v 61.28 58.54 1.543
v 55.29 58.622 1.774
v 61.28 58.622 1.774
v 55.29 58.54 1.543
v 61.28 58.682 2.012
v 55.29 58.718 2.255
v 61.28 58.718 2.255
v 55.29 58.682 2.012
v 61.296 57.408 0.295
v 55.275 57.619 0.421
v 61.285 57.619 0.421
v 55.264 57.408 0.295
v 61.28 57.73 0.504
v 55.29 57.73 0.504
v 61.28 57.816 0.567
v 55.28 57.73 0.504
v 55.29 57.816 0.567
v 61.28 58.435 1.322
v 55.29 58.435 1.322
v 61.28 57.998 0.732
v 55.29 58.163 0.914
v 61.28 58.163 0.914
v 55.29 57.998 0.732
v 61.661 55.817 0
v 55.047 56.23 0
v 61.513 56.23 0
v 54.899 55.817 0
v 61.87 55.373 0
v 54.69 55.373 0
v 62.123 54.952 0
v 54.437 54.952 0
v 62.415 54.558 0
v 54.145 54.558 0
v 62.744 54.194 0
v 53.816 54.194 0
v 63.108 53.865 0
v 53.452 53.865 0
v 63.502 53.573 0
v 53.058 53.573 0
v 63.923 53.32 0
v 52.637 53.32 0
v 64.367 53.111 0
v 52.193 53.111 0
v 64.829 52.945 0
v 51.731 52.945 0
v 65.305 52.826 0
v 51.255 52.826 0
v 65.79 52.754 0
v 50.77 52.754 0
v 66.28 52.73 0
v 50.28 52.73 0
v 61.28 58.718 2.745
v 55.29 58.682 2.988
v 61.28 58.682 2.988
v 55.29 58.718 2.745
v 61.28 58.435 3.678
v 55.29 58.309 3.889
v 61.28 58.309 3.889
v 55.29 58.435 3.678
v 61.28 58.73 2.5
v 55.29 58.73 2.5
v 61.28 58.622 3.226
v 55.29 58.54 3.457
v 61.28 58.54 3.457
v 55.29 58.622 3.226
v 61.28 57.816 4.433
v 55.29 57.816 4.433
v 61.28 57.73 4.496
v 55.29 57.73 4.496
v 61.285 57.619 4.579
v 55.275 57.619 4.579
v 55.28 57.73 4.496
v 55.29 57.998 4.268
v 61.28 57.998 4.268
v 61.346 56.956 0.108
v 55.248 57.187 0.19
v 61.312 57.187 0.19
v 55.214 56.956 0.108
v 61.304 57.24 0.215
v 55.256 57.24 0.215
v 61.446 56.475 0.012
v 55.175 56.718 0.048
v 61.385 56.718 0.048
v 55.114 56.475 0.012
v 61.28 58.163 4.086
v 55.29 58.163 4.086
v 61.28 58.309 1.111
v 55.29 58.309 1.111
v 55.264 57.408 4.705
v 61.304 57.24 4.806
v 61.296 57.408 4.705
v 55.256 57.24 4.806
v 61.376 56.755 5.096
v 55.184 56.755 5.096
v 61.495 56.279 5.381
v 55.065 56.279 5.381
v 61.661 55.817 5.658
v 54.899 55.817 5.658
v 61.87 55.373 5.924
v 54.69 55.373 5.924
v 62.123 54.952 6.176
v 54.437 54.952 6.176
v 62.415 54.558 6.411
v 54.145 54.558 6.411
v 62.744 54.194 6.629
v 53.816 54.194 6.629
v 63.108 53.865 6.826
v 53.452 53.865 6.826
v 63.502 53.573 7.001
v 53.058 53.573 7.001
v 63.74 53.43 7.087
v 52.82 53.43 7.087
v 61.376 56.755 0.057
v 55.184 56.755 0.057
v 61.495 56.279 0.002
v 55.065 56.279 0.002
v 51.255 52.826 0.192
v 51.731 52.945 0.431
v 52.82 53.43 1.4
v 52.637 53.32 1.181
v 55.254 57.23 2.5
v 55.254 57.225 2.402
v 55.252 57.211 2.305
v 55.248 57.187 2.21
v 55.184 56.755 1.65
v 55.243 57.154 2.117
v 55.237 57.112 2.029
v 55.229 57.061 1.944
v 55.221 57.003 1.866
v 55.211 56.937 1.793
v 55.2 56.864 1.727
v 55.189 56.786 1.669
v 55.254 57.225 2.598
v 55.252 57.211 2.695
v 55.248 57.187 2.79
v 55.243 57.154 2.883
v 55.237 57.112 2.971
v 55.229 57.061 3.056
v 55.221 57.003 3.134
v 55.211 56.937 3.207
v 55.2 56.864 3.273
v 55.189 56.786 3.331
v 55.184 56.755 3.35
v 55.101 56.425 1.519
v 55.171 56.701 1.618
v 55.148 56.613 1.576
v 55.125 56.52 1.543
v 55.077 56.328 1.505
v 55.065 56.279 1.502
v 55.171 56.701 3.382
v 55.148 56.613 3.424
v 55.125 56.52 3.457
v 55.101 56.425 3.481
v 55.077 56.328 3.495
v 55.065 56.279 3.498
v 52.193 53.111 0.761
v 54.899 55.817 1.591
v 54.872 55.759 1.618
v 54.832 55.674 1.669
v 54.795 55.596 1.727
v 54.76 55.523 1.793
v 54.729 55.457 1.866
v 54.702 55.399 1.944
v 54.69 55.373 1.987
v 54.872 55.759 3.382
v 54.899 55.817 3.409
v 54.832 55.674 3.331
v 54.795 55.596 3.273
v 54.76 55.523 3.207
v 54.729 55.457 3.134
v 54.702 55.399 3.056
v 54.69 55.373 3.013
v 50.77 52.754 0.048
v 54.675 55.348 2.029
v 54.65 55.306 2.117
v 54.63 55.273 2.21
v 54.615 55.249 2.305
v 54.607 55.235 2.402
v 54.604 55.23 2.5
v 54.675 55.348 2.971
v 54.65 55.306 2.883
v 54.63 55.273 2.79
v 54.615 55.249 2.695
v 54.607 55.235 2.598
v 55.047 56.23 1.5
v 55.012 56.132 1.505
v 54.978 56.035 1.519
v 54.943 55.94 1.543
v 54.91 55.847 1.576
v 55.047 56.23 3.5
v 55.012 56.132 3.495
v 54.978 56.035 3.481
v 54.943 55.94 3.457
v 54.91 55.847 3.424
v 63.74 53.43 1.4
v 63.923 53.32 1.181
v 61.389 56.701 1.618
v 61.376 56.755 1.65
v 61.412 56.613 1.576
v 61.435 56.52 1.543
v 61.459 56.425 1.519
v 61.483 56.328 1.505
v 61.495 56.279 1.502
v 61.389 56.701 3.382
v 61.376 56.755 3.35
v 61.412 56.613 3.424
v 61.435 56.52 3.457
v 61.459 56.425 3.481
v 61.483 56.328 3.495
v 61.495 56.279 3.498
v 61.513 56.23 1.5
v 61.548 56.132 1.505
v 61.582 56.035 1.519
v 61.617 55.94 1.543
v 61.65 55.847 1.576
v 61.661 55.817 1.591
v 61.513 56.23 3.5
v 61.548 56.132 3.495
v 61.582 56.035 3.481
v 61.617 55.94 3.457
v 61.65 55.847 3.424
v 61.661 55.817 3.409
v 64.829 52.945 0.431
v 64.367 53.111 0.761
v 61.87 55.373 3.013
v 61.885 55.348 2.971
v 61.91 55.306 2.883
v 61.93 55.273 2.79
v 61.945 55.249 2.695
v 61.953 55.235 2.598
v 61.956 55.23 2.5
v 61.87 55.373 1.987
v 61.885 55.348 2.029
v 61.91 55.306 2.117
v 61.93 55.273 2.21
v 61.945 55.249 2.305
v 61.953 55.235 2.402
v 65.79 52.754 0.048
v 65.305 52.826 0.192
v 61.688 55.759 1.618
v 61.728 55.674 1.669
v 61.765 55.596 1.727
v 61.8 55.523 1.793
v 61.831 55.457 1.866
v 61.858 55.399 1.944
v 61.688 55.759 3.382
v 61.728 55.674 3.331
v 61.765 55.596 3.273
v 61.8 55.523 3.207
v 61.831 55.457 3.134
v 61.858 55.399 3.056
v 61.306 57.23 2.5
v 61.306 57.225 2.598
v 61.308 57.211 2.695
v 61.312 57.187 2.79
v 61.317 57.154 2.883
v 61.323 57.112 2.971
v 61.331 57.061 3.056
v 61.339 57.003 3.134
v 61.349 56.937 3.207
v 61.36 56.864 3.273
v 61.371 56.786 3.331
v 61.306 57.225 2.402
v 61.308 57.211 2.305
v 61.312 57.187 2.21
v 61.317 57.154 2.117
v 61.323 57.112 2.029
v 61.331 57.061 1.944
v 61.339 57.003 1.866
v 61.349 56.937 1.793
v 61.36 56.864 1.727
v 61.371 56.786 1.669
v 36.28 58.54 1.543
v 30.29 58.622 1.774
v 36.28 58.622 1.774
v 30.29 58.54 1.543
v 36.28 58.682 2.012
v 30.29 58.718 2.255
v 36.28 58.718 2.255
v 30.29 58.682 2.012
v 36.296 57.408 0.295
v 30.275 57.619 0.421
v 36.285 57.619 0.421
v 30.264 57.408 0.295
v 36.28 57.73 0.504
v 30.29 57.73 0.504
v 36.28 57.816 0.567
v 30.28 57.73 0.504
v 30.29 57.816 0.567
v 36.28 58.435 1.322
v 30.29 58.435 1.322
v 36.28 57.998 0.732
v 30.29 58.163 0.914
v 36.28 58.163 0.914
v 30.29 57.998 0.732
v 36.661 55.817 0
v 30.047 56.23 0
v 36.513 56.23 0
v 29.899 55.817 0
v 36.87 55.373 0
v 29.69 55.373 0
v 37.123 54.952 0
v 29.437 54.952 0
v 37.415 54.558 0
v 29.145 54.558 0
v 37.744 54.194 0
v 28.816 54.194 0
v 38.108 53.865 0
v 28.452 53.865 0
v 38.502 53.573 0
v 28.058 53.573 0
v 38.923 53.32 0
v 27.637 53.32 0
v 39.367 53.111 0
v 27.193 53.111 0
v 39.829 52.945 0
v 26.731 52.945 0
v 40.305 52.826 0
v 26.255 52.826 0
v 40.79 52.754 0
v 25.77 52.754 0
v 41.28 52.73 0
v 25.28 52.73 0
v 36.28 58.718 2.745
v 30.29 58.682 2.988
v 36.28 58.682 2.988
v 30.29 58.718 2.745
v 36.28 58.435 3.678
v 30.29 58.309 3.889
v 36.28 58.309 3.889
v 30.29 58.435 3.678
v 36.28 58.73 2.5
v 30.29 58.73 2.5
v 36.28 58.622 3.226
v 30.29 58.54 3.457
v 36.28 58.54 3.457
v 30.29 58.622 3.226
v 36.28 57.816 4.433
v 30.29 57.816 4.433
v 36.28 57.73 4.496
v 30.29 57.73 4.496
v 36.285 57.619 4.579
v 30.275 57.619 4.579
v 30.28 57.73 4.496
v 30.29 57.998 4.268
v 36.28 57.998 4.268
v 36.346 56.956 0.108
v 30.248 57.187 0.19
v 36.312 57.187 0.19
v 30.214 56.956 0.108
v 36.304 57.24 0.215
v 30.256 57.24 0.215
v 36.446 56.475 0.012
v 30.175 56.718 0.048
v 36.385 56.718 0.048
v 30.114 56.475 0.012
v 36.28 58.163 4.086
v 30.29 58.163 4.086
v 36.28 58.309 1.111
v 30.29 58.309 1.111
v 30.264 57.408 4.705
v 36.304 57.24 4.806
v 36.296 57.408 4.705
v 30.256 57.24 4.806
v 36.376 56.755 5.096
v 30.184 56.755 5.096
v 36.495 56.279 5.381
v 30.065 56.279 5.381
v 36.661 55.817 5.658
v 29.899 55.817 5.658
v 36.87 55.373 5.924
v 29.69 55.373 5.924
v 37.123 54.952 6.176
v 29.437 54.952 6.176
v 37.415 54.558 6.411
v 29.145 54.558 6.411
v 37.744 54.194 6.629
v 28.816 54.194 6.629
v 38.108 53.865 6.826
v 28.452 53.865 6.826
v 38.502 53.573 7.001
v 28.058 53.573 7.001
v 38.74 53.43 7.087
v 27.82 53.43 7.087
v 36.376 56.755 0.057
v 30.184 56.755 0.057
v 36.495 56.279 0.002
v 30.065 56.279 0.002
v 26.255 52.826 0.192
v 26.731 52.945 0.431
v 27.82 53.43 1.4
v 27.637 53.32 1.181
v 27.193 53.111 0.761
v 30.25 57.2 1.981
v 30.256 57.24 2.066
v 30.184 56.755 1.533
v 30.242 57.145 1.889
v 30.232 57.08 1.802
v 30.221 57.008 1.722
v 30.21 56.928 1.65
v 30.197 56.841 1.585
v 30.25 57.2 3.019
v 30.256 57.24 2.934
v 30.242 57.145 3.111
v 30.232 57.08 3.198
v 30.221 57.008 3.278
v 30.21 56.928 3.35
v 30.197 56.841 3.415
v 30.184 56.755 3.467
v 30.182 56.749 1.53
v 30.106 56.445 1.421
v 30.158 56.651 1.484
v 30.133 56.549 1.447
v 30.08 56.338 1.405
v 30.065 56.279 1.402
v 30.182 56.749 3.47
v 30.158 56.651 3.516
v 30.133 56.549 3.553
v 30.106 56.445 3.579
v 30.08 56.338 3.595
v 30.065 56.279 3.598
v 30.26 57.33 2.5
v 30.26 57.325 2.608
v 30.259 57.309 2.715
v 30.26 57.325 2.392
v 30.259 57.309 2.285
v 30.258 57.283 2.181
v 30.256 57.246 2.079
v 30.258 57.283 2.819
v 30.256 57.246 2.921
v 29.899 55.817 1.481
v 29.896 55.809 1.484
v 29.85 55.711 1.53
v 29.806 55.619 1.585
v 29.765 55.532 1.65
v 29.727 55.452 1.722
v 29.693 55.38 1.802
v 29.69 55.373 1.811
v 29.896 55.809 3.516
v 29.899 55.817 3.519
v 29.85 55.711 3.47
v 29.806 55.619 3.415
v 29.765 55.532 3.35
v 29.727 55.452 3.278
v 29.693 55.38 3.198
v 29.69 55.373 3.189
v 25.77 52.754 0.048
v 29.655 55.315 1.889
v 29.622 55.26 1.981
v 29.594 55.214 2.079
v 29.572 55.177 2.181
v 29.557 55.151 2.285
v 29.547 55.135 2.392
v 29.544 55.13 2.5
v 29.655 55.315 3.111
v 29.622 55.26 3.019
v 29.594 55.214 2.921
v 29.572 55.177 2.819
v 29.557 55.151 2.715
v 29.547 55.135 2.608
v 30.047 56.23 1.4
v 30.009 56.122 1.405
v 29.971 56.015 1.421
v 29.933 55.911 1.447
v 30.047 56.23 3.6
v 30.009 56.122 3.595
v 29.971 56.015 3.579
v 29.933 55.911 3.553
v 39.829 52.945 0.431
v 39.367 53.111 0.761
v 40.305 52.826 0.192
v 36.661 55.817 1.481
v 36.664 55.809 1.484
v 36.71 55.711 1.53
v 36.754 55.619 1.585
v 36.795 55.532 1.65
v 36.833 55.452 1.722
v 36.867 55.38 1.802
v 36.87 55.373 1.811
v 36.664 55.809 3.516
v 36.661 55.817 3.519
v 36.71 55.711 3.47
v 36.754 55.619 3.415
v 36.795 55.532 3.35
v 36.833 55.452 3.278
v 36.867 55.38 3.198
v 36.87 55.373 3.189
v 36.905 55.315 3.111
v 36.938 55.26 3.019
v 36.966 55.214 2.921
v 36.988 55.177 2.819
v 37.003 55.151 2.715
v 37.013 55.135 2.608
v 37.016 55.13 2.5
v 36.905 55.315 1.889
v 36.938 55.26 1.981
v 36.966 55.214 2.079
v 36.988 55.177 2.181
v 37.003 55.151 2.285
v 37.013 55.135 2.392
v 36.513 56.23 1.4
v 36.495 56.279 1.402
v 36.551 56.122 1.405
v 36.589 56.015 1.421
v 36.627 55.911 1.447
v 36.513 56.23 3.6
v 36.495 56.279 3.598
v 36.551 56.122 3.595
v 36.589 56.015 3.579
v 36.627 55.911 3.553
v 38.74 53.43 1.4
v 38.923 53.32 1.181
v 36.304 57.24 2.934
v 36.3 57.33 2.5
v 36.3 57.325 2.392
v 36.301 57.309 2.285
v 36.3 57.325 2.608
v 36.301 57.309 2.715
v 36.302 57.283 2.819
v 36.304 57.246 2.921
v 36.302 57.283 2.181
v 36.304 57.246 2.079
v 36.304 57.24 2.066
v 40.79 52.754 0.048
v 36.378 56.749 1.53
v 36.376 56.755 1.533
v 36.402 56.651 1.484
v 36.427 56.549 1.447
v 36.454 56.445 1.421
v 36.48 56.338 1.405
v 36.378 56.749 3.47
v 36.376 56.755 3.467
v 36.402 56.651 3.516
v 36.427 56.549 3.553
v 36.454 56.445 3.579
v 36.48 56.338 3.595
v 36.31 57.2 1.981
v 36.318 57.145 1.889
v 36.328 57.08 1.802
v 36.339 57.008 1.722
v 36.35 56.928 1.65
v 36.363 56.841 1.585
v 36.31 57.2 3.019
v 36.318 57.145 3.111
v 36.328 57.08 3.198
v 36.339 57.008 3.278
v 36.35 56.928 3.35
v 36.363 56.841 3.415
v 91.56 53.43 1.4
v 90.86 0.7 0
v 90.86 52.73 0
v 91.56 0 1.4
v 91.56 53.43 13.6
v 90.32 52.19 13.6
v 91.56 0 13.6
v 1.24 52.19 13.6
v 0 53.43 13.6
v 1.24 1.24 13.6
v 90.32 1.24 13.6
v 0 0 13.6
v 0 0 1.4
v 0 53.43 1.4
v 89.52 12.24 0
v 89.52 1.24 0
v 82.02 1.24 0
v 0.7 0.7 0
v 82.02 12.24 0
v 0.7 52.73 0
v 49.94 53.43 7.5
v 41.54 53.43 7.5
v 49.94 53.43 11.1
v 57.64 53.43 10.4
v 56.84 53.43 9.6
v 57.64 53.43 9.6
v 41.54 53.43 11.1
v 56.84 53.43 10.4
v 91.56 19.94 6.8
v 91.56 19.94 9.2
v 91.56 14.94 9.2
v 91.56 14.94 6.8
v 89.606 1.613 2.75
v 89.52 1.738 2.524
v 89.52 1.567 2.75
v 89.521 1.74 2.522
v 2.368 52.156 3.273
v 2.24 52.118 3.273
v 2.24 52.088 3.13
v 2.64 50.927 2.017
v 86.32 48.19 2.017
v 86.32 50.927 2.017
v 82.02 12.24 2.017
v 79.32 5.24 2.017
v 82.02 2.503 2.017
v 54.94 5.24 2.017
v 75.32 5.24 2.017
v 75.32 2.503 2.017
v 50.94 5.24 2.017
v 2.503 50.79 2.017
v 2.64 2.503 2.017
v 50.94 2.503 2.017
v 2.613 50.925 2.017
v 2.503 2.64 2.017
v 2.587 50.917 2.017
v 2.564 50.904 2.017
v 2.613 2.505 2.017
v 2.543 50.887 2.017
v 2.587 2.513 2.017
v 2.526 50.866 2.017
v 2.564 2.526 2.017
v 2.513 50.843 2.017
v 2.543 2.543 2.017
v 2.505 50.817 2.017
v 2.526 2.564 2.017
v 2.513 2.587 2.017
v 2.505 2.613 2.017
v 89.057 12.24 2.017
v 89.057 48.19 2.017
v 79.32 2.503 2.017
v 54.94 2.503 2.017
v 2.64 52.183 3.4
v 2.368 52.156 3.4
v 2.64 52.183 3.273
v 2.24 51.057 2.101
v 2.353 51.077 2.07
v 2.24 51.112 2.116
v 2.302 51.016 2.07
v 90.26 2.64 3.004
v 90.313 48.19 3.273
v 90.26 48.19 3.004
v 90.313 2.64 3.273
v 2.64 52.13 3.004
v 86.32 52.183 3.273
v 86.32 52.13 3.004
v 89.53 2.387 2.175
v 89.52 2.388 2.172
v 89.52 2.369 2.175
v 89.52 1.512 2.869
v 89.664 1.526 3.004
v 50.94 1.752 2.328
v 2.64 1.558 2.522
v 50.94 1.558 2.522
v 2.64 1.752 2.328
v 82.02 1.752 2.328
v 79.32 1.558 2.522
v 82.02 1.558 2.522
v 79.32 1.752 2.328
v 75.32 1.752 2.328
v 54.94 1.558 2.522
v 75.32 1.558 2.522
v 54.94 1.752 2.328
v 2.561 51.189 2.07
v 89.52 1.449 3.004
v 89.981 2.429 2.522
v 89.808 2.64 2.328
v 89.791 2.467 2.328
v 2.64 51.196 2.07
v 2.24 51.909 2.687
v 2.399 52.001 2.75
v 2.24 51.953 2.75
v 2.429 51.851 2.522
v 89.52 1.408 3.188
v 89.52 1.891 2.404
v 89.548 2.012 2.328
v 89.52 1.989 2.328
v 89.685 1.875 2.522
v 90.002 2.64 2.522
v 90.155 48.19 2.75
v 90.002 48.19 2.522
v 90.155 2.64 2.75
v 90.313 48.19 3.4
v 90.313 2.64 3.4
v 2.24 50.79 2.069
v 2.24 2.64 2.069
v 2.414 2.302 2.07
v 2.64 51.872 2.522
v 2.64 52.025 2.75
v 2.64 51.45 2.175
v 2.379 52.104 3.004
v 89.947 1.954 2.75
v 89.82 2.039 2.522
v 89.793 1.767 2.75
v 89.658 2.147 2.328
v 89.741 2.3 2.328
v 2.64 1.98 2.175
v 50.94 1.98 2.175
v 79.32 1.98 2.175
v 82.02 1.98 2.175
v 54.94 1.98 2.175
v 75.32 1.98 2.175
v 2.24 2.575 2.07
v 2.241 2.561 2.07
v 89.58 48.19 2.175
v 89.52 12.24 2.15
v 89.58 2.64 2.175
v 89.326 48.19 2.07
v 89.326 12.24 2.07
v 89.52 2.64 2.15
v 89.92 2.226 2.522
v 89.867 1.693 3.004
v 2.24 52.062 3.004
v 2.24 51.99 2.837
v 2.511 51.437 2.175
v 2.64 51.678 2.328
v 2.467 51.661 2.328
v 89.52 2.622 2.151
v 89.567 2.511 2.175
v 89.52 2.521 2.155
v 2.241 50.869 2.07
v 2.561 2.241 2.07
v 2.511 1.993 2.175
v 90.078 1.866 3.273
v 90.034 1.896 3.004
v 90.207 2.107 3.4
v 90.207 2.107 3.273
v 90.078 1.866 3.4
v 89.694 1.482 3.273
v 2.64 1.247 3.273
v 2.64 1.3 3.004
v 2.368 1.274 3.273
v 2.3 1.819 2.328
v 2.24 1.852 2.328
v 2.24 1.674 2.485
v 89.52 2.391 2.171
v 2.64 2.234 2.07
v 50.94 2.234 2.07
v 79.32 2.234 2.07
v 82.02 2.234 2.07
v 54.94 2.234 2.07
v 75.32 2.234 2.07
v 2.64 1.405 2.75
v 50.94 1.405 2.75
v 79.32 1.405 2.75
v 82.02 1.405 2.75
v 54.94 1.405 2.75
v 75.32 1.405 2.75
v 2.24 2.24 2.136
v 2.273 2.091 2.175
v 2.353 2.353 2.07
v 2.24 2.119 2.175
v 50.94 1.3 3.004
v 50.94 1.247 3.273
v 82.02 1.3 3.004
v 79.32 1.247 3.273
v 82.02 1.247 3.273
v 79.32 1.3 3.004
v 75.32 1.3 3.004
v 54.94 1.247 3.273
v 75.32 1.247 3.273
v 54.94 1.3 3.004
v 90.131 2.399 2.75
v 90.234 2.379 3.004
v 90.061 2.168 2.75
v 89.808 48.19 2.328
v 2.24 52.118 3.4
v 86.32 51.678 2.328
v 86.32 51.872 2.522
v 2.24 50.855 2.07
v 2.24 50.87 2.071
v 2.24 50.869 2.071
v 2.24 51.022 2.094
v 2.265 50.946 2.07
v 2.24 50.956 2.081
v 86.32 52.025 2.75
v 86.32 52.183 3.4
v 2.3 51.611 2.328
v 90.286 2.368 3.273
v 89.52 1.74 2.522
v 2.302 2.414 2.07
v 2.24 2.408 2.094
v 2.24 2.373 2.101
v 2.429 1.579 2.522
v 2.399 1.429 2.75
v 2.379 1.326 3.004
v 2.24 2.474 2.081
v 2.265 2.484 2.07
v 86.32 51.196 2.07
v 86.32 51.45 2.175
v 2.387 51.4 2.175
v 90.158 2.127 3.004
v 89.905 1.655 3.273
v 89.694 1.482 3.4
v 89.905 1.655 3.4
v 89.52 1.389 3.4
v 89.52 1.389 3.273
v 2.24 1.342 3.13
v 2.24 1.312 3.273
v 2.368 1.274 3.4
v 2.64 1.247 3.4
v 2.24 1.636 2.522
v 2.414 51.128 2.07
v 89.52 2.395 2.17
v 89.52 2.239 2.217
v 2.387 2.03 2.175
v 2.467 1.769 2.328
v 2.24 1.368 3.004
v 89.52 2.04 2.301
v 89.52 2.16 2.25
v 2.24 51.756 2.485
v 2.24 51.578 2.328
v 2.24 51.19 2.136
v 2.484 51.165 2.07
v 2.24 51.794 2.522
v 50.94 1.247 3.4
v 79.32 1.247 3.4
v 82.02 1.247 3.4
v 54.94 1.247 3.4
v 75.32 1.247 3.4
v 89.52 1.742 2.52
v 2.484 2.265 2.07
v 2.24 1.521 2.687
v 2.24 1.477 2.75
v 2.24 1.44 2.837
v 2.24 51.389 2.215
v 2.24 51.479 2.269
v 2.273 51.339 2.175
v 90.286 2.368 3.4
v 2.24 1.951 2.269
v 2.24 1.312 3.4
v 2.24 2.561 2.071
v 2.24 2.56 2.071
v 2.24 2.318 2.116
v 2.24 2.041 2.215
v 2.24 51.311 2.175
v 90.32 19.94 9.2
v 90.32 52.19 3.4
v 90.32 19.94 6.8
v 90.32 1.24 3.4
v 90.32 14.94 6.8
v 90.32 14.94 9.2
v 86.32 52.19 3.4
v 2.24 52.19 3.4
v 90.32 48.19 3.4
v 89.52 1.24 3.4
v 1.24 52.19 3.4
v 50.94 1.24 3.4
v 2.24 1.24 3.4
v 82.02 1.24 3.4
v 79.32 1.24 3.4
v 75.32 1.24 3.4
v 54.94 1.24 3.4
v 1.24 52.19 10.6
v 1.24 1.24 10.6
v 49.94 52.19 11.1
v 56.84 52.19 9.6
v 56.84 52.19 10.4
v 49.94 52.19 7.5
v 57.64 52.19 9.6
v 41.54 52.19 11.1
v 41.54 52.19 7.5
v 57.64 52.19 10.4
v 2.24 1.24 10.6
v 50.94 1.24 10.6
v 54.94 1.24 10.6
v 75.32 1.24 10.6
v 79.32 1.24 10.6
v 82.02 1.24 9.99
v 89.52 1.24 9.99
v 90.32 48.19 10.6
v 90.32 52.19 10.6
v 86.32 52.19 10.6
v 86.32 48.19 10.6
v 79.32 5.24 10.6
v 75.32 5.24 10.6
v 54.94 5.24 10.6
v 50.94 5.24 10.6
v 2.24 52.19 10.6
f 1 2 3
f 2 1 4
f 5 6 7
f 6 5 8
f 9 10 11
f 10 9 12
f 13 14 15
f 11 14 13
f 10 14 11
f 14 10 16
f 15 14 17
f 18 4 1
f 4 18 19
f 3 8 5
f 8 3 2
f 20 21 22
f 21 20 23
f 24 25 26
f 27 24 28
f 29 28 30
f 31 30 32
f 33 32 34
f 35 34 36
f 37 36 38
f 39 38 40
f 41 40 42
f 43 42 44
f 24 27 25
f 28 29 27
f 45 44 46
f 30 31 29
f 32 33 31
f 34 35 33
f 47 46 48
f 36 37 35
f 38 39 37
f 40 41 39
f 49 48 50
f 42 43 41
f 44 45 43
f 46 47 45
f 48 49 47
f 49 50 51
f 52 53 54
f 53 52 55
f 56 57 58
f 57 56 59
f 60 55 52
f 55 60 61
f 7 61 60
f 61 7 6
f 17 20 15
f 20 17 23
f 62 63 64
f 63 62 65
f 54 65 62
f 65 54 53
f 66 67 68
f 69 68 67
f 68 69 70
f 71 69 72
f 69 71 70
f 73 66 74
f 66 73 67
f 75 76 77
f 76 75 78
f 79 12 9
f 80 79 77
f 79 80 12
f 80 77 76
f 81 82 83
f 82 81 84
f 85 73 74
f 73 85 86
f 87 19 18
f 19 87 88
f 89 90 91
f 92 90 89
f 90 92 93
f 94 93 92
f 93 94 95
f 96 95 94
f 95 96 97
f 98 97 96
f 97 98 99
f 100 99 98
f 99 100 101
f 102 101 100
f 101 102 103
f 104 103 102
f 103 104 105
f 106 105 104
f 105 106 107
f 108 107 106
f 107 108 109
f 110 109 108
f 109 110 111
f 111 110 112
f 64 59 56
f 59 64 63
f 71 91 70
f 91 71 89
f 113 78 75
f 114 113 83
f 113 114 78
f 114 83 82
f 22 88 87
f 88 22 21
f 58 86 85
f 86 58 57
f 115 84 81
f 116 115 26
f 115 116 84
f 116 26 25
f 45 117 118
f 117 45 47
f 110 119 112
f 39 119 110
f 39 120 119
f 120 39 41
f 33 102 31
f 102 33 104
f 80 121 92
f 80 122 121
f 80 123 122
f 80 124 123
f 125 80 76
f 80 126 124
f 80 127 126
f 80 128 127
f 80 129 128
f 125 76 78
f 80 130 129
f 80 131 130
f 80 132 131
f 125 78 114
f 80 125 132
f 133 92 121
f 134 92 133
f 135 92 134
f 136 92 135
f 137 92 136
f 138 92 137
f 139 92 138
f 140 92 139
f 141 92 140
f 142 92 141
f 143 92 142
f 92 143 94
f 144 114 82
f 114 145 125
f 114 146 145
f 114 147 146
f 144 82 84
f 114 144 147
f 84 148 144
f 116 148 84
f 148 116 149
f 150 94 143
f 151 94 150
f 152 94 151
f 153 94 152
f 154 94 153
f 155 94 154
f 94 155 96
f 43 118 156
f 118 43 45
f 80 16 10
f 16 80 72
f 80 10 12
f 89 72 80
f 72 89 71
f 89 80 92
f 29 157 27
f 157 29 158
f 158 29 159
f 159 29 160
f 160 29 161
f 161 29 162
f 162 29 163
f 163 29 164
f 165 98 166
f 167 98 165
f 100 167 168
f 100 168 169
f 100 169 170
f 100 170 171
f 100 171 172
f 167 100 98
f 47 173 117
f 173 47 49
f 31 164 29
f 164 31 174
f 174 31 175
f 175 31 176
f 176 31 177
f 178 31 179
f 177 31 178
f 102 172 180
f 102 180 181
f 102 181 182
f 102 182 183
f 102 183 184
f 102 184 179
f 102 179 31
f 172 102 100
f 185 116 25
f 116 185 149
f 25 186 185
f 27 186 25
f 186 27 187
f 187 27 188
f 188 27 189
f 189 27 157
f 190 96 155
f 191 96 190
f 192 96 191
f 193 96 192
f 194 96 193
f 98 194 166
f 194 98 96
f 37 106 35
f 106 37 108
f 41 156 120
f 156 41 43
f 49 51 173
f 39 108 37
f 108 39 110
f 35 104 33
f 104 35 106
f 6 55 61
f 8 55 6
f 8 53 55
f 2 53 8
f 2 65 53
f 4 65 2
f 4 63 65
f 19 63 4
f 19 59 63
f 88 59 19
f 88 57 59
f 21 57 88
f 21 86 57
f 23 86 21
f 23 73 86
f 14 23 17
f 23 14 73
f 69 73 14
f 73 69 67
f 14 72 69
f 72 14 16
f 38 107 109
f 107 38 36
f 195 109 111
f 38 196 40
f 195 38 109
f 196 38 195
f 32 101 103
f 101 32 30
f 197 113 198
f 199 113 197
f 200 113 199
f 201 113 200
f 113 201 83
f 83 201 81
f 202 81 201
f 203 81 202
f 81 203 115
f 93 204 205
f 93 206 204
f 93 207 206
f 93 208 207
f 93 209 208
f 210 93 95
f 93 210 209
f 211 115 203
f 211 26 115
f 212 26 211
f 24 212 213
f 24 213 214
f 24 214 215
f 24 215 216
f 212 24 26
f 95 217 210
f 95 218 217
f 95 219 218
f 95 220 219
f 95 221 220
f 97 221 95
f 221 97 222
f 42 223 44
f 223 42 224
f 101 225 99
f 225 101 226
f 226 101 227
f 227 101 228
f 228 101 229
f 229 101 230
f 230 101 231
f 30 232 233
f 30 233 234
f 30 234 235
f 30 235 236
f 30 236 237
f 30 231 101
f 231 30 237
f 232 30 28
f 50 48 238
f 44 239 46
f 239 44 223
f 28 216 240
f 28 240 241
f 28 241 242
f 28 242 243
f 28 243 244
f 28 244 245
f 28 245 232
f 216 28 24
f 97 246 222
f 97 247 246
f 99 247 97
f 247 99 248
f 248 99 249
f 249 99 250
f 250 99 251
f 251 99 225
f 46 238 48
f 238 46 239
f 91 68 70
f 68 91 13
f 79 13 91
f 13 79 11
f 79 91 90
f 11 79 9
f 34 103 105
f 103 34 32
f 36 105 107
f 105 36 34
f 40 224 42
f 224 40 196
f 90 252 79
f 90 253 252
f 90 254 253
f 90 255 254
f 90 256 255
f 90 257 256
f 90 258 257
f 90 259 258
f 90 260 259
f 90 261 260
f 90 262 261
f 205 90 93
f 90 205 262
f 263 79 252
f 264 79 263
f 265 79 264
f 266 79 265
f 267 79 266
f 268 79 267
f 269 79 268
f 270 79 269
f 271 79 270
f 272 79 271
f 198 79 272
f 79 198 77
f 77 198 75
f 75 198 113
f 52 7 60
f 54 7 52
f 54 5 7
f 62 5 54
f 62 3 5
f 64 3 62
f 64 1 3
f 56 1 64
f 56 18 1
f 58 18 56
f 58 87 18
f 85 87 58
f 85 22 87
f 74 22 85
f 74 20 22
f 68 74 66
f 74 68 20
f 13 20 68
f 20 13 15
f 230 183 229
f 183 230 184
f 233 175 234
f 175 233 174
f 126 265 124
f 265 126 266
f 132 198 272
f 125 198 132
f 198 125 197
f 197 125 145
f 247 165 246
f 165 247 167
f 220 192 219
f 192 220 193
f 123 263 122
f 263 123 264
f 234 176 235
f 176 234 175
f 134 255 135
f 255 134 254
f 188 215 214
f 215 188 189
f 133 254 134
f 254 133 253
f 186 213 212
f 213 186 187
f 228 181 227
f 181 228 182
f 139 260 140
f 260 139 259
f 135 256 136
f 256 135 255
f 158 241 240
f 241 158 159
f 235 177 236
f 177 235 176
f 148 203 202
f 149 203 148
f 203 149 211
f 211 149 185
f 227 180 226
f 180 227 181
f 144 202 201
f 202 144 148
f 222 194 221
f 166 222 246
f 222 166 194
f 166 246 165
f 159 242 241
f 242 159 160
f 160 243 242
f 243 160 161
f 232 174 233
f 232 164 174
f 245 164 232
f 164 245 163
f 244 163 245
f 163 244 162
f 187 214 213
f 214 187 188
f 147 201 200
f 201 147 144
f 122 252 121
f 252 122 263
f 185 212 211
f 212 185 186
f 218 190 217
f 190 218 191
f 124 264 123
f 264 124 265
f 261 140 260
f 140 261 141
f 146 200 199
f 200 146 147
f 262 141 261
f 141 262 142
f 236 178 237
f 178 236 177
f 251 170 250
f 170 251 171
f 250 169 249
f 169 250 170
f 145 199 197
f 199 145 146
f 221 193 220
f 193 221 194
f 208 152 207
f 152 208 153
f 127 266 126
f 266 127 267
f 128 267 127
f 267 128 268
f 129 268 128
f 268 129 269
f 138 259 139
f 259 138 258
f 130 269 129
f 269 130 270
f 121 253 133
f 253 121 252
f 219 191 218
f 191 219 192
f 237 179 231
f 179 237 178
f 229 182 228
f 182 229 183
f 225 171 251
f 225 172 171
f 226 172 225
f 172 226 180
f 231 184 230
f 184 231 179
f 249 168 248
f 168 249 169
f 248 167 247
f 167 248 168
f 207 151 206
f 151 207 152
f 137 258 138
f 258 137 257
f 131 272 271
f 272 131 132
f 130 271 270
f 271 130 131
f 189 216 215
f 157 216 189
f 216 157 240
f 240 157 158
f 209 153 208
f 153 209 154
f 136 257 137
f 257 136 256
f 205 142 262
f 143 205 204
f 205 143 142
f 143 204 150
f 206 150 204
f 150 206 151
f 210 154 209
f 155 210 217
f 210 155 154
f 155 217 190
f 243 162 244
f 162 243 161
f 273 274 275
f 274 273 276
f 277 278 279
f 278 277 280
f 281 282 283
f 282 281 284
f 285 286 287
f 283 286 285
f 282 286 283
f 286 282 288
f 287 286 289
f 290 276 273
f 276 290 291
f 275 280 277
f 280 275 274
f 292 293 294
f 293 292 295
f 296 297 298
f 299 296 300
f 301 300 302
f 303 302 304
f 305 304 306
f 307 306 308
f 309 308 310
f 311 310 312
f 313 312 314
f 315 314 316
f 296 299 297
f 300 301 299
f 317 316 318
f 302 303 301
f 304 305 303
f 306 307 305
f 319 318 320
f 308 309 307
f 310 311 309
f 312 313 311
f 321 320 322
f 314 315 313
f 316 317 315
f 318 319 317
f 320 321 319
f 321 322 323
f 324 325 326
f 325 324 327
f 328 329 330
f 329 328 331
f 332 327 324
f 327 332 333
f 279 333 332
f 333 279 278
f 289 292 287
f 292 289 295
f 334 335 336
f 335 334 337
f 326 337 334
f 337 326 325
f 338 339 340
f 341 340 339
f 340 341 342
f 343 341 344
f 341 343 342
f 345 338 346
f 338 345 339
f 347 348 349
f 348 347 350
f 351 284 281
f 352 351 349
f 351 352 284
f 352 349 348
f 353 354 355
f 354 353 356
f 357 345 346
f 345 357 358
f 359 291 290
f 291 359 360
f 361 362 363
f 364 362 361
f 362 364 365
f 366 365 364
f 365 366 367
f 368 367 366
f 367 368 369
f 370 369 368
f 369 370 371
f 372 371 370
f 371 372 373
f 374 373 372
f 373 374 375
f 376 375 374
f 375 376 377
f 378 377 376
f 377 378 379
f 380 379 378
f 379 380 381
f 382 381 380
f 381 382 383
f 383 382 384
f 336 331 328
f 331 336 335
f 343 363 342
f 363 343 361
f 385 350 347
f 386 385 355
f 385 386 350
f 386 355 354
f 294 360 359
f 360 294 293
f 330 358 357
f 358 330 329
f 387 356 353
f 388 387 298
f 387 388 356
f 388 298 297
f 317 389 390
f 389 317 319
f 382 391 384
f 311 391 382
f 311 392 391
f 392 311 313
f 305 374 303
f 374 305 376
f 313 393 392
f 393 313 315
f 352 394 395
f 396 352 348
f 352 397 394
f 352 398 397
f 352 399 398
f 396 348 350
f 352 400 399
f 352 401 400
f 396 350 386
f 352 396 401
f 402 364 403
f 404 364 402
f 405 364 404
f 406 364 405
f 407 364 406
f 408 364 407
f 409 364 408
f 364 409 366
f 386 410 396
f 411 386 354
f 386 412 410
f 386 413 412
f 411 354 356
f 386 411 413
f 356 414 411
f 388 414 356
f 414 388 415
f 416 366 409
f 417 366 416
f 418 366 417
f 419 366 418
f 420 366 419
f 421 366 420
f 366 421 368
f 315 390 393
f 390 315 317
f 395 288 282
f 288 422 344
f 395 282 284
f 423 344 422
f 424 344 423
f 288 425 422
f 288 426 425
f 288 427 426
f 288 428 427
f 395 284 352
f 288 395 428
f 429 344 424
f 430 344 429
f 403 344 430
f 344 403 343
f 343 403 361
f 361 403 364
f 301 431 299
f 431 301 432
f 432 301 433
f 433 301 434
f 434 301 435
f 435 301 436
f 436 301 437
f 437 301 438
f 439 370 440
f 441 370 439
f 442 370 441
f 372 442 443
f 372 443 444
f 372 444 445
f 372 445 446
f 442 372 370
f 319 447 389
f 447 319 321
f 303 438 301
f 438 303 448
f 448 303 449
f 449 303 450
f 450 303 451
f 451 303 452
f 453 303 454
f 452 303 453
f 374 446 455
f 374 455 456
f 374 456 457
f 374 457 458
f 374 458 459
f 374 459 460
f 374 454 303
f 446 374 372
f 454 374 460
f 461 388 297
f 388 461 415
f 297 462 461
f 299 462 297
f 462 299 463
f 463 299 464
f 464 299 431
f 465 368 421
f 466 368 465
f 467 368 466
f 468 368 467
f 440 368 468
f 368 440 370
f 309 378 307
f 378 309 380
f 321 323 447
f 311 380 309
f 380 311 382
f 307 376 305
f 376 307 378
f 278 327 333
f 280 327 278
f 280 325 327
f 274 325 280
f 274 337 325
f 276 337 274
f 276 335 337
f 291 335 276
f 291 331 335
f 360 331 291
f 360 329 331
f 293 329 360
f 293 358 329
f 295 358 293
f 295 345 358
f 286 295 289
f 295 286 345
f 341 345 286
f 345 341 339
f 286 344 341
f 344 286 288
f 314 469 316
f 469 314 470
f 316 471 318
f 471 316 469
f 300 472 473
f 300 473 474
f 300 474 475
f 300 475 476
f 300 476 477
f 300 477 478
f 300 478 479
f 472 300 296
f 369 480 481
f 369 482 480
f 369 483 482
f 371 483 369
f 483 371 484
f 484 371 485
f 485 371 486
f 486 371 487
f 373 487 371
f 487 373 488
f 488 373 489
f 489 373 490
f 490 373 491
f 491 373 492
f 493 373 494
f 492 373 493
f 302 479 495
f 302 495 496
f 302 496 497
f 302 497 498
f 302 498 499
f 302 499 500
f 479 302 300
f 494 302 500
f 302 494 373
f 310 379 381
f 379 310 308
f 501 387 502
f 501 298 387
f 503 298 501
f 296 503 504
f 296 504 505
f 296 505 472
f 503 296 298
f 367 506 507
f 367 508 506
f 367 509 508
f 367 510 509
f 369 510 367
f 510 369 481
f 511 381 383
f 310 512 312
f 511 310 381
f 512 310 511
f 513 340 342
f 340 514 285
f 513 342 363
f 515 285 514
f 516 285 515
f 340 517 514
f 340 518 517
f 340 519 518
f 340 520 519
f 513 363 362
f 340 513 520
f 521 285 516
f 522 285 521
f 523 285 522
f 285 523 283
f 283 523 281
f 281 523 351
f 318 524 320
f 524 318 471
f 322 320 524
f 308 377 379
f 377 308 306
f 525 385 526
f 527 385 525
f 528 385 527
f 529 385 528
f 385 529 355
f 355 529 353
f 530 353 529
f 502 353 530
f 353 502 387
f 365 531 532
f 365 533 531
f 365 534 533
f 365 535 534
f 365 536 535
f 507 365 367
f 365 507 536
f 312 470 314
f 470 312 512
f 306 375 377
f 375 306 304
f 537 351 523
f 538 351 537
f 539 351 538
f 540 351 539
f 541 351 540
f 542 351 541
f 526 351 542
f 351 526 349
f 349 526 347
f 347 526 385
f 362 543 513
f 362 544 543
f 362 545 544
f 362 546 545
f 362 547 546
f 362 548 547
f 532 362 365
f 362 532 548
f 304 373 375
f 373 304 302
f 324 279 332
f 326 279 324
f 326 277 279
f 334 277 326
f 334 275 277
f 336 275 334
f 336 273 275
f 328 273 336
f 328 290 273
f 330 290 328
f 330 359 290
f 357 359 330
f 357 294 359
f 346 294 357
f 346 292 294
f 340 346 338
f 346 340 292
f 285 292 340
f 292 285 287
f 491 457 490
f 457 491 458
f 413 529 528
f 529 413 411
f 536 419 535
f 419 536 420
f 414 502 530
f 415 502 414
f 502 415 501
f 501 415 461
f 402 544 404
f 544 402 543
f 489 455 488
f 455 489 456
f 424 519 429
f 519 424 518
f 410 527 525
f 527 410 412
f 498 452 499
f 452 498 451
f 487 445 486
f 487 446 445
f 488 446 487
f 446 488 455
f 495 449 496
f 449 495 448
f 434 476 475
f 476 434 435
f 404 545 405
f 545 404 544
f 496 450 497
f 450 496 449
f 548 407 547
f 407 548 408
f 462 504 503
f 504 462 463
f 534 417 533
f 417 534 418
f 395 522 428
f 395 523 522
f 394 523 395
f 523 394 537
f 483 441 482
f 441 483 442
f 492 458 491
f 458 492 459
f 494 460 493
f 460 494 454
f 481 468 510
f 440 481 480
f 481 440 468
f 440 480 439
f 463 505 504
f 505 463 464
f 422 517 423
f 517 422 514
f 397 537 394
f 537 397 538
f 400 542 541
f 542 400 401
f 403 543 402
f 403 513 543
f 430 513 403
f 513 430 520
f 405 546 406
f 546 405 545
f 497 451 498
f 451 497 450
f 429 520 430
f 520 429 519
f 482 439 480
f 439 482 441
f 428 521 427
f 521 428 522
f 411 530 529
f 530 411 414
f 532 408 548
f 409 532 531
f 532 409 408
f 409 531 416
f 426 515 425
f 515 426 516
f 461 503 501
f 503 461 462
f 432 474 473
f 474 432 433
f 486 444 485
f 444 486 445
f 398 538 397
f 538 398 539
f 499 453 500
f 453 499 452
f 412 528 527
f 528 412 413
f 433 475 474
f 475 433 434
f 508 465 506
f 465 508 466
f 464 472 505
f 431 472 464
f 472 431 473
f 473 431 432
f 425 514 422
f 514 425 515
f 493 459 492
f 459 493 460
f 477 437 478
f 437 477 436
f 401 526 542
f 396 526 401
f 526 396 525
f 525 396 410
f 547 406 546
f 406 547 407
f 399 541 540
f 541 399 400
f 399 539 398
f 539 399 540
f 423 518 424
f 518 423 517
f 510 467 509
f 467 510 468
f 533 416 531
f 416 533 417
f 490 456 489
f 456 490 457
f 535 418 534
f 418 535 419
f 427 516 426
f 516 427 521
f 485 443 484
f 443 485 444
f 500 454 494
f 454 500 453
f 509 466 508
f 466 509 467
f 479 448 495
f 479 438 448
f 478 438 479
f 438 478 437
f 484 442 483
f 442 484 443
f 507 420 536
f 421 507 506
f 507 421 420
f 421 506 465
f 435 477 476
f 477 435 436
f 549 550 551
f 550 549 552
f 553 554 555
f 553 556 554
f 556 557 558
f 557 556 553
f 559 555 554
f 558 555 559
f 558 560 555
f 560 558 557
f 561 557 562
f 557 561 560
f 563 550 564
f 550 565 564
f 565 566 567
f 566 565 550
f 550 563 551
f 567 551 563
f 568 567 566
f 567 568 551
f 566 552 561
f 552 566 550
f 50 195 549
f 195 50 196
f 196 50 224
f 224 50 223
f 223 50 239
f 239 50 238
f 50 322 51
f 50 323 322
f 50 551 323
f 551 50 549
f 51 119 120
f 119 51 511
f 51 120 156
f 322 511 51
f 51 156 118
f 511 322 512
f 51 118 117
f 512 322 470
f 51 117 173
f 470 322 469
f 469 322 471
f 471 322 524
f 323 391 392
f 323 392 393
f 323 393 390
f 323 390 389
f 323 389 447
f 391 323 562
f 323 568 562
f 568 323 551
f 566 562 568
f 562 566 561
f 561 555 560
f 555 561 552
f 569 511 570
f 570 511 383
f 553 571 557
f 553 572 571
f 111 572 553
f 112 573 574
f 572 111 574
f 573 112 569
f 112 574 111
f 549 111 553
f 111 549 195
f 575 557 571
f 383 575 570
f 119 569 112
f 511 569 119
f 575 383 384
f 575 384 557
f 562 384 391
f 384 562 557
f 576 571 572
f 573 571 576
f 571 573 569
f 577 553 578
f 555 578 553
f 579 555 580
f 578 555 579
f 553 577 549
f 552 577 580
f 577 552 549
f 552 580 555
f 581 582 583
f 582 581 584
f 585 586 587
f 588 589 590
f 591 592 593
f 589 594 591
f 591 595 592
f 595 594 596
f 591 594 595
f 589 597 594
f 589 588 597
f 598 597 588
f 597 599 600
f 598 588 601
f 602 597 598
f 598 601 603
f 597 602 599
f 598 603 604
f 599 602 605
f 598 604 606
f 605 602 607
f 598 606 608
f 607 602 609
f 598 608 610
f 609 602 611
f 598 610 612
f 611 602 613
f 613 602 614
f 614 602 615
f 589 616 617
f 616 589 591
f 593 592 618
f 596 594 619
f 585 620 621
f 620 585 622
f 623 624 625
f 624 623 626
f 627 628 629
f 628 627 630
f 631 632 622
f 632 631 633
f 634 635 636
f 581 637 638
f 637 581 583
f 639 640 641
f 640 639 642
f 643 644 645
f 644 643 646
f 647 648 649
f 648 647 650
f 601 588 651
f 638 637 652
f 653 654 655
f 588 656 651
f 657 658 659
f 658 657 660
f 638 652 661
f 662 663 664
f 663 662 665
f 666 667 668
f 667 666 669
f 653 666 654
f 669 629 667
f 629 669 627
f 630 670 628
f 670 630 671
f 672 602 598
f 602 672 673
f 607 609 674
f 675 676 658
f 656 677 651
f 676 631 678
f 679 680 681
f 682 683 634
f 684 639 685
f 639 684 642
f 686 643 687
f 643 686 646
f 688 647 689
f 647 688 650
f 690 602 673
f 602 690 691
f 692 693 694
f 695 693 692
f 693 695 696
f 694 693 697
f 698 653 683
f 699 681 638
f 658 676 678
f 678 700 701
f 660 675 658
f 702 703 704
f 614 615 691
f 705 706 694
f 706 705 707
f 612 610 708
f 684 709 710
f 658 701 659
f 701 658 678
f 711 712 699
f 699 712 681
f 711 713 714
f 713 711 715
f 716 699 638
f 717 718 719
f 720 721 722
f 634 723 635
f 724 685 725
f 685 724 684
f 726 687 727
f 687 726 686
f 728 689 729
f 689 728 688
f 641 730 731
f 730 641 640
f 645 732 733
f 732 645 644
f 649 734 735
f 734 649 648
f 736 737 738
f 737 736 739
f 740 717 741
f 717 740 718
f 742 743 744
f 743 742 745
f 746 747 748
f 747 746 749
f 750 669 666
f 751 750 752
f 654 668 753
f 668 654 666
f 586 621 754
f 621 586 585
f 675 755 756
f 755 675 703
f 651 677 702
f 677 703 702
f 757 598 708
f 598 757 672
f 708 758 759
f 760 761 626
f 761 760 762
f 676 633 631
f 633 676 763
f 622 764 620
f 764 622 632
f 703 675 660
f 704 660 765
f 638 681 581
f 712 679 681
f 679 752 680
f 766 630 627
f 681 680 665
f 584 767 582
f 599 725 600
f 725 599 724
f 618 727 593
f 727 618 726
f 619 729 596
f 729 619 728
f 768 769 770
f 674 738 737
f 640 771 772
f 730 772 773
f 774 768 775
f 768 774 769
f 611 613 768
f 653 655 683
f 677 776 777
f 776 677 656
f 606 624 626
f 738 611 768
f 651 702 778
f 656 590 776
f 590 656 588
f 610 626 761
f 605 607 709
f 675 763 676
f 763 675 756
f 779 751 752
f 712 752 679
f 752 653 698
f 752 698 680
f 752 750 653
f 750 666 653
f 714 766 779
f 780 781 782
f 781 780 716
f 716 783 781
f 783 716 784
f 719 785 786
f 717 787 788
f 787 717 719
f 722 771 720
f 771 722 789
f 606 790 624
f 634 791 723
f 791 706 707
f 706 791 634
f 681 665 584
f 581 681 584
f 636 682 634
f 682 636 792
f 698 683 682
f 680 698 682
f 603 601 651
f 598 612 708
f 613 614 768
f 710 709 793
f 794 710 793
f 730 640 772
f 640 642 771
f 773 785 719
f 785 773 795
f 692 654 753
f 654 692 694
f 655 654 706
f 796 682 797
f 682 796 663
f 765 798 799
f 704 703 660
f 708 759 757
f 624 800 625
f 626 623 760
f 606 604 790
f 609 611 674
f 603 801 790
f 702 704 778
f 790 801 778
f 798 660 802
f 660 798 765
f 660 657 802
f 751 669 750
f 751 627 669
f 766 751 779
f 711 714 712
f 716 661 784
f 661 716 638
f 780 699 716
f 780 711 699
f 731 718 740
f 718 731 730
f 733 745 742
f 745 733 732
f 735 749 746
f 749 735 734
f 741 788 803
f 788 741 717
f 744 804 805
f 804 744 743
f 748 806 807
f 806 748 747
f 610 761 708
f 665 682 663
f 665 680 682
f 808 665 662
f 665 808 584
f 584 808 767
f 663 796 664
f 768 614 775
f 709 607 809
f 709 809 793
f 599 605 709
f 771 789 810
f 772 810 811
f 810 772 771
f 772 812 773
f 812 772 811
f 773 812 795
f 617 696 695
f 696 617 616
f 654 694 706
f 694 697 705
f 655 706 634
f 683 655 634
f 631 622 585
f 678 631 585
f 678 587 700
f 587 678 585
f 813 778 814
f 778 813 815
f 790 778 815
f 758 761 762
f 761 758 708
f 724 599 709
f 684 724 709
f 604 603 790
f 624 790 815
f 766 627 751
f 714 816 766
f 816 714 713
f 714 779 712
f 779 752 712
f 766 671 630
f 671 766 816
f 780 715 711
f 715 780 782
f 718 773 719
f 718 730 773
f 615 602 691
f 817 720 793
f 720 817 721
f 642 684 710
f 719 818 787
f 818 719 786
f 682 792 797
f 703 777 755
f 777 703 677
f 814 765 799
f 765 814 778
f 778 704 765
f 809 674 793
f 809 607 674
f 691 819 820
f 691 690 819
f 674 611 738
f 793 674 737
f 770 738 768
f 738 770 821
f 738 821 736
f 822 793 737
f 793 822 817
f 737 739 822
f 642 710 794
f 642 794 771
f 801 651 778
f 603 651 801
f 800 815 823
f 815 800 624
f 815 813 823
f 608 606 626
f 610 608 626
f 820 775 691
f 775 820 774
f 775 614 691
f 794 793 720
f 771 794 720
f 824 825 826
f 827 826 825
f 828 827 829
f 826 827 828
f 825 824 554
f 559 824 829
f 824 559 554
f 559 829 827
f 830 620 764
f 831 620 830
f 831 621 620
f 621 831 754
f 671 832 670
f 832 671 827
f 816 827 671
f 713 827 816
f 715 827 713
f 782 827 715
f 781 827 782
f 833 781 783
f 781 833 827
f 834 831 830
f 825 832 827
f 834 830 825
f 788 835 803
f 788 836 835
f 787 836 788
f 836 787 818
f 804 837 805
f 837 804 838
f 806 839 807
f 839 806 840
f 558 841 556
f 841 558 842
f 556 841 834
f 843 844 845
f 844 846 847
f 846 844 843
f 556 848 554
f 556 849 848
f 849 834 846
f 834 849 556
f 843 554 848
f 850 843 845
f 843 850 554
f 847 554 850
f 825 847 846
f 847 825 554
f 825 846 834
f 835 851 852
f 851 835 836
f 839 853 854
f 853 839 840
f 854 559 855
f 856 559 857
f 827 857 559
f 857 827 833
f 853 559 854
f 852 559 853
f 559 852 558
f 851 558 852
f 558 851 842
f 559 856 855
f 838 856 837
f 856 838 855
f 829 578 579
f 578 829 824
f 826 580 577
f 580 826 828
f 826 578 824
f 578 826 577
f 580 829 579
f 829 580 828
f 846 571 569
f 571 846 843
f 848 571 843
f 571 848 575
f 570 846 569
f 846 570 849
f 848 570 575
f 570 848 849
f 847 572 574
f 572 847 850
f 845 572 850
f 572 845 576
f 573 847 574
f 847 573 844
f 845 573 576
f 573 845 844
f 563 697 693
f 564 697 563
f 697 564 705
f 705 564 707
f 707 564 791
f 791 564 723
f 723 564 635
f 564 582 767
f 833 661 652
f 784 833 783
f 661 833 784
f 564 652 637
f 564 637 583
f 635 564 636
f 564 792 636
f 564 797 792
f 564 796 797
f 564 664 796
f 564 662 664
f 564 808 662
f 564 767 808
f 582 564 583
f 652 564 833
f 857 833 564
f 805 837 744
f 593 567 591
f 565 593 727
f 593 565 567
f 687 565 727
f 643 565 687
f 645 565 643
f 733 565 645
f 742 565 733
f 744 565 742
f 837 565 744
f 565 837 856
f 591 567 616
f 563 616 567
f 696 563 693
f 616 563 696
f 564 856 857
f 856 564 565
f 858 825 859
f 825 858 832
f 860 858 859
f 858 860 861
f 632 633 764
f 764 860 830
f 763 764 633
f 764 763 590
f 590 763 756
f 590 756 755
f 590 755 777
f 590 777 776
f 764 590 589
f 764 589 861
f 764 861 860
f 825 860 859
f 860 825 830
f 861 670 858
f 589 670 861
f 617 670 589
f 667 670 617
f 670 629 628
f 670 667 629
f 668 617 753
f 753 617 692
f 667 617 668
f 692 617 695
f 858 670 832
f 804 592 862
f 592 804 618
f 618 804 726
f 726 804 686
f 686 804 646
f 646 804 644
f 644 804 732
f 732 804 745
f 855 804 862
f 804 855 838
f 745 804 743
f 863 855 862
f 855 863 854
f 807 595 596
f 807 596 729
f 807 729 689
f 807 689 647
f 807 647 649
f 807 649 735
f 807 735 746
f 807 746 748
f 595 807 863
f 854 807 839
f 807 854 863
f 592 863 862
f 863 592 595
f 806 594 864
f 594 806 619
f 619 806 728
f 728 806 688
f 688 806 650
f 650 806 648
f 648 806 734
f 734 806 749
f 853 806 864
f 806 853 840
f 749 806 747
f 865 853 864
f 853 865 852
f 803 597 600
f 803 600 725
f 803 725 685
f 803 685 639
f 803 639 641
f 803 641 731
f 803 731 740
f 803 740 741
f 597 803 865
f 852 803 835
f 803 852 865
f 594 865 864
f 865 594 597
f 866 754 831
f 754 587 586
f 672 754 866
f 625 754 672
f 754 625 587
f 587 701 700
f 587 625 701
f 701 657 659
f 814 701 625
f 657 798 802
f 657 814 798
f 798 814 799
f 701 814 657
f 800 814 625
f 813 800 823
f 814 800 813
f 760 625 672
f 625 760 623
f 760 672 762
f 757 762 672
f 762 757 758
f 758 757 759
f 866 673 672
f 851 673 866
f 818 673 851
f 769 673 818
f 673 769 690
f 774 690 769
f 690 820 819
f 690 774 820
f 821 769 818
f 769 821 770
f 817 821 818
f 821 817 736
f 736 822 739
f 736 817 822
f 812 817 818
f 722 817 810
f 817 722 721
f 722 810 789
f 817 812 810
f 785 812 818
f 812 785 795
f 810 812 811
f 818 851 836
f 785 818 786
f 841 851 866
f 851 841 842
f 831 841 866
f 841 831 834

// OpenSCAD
PERIMETER_THICKNESS = 1.24;
BOTTOM_WALL_THICKNESS = 2;
PCB_MARGIN = 0.1; // gap between case and PCB


CAVITY_DEPTH = 8.6; // depth in case behind the PCB
BEZEL_LIP_DEPTH = 1.4; // height of the bezel over the PCB

PCB_THICKNESS = 1.6;
PCB_WIDTH = 88.88;
PCB_LENGTH = 50.75;

CAVITY_WIDTH = PCB_WIDTH + (PCB_MARGIN * 2);
CAVITY_LENGTH = PCB_LENGTH + (PCB_MARGIN * 2);
BOTTOM_ROUNDING_DIA = 2.8;

CASE_WIDTH = CAVITY_WIDTH + (PERIMETER_THICKNESS * 2);
CASE_LENGTH = CAVITY_LENGTH + (PERIMETER_THICKNESS * 2);
CASE_DEPTH = PCB_THICKNESS + BEZEL_LIP_DEPTH + CAVITY_DEPTH + BOTTOM_WALL_THICKNESS;

STANDOFF_WIDTH = 4;
STANDOFF_LENGTH = 4;

HANDLE_WIDTH = 6;
HANDLE_LENGTH = 6;
HANDLE_HEIGHT = 5;
HANDLE_HOLE_DIA = 2.0;
HANDLE_SPACING = 25;

SWITCH_DIM = [5.0, 5.0, 2.4];
SWITCH_LOC = [CASE_WIDTH - PERIMETER_THICKNESS - (PCB_MARGIN * 2), PERIMETER_THICKNESS + PCB_MARGIN + 13.6, CAVITY_DEPTH + BOTTOM_WALL_THICKNESS - 3.8];

USB_DIM = [8.4, 5.0, 3.6];
USB_LOC = [PERIMETER_THICKNESS + PCB_MARGIN + 40.2, CASE_LENGTH - PERIMETER_THICKNESS - (PCB_MARGIN * 2), CAVITY_DEPTH + BOTTOM_WALL_THICKNESS - 3.1];

LED_DIM = [0.8, 4.0, 0.8];
LED_LOC = [PERIMETER_THICKNESS + PCB_MARGIN + 55.5,
        CASE_LENGTH - PERIMETER_THICKNESS - (PCB_MARGIN * 2), CAVITY_DEPTH + BOTTOM_WALL_THICKNESS - 1.0];

PROBE_DIM = [7.5, 11, 10];
PROBE_LOC = [(CASE_WIDTH - PERIMETER_THICKNESS) + PCB_MARGIN - 8.4,
PERIMETER_THICKNESS , -0.01];

module fil_handle(width, length, height, fillet_dia, hole_dia) {
    fillet_rad = fillet_dia / 2;
    translate([-(width + fillet_dia) / 2, 0, 0]) difference() {
        hull() {
            cube([width + fillet_dia, 0.01, height * 1.5]);
            translate([0, length - height / 2, height / 2]) rotate([0, 90, 0]) cylinder(d=height, h=width + fillet_dia, $fn=64);
        }
        translate([0,fillet_rad,-0.01]) cylinder(r=fillet_rad, h=height + fillet_rad + 0.02, $fn=64);
    
        translate([-0.01, fillet_rad, -0.01]) cube([fillet_rad + 0.02, length, height + fillet_rad + 0.02]);
        translate([width + fillet_dia, fillet_rad,-0.01]) cylinder(r=fillet_rad, h=height + fillet_rad + 0.02, $fn=64);
        translate([width + fillet_rad, fillet_rad, -0.01]) cube([fillet_rad + 0.02, length, height + fillet_rad + 0.02]);
    
    translate([- 0.01, length - height / 2, height / 2]) rotate([0, 90, 0]) cylinder(d=hole_dia, h=width + fillet_dia + 0.02, $fn=64);
    }
}

difference() {
    union() {
        hull() {
        translate([0, 0, BOTTOM_ROUNDING_DIA / 2]) cube([CASE_WIDTH, CASE_LENGTH, CASE_DEPTH -      BOTTOM_ROUNDING_DIA/2]);
            translate([BOTTOM_ROUNDING_DIA/4,      BOTTOM_ROUNDING_DIA/4, 0]) cube([CASE_WIDTH-BOTTOM_ROUNDING_DIA/2, CASE_LENGTH-BOTTOM_ROUNDING_DIA/2, 1]);
        }
 
        //handle 2
        translate([(CASE_WIDTH + HANDLE_SPACING) / 2, CASE_LENGTH - BOTTOM_ROUNDING_DIA / 4, 0]) fil_handle(HANDLE_WIDTH, HANDLE_LENGTH, HANDLE_HEIGHT, HANDLE_HEIGHT * 2, HANDLE_HOLE_DIA);
    
        translate([(CASE_WIDTH - HANDLE_SPACING) / 2, CASE_LENGTH - BOTTOM_ROUNDING_DIA / 4, 0]) fil_handle(HANDLE_WIDTH, HANDLE_LENGTH, HANDLE_HEIGHT, HANDLE_HEIGHT * 2, HANDLE_HOLE_DIA+0.2);
    }
    translate([(CASE_WIDTH - CAVITY_WIDTH) / 2, (CASE_LENGTH - CAVITY_LENGTH) / 2, BOTTOM_WALL_THICKNESS + 0.01])
        union() {
            translate([BOTTOM_ROUNDING_DIA / 2, BOTTOM_ROUNDING_DIA / 2, BOTTOM_ROUNDING_DIA / 2])
            minkowski() {
                cube([CAVITY_WIDTH - BOTTOM_ROUNDING_DIA, CAVITY_LENGTH - BOTTOM_ROUNDING_DIA, 0.01]);
                sphere(d = BOTTOM_ROUNDING_DIA, $fn=32);
            }
            translate([0, 0, (BOTTOM_ROUNDING_DIA / 2) - 0.01])
                cube([CAVITY_WIDTH, CAVITY_LENGTH, CAVITY_DEPTH * 2 + PCB_THICKNESS - BOTTOM_ROUNDING_DIA + 0.01]);
        }
    translate(SWITCH_LOC) cube(SWITCH_DIM);
    translate(USB_LOC) cube(USB_DIM);
    translate(LED_LOC) cube(LED_DIM);
    translate(PROBE_LOC) cube(PROBE_DIM);
}

STANDOFF_LOCATIONS = [
    //[PERIMETER_THICKNESS, PERIMETER_THICKNESS, BOTTOM_WALL_THICKNESS],
    [CASE_WIDTH - PERIMETER_THICKNESS - STANDOFF_WIDTH, CASE_LENGTH - PERIMETER_THICKNESS - STANDOFF_LENGTH, BOTTOM_WALL_THICKNESS],
    [CASE_WIDTH - PERIMETER_THICKNESS - STANDOFF_WIDTH - 11.0, PERIMETER_THICKNESS, BOTTOM_WALL_THICKNESS],
    //[PERIMETER_THICKNESS, CASE_LENGTH - PERIMETER_THICKNESS - STANDOFF_LENGTH, BOTTOM_WALL_THICKNESS],
    [PERIMETER_THICKNESS + 49.7, PERIMETER_THICKNESS, BOTTOM_WALL_THICKNESS],

];

for(LOC=STANDOFF_LOCATIONS) {
    translate(LOC) cube([STANDOFF_WIDTH, STANDOFF_LENGTH, CAVITY_DEPTH]);
}
// special standoff for left and large bat
translate([PERIMETER_THICKNESS, PERIMETER_THICKNESS, BOTTOM_WALL_THICKNESS]) cube([1, CAVITY_LENGTH, CAVITY_DEPTH]);
//translate([PERIMETER_THICKNESS, PERIMETER_THICKNESS, BOTTOM_WALL_THICKNESS]) cube([30, 14, CAVITY_DEPTH]);
/* For debug...
%translate([PERIMETER_THICKNESS + PCB_MARGIN, PERIMETER_THICKNESS + PCB_MARGIN, BOTTOM_WALL_THICKNESS + CAVITY_DEPTH]) cube([PCB_WIDTH, PCB_LENGTH, PCB_THICKNESS]);
*/
